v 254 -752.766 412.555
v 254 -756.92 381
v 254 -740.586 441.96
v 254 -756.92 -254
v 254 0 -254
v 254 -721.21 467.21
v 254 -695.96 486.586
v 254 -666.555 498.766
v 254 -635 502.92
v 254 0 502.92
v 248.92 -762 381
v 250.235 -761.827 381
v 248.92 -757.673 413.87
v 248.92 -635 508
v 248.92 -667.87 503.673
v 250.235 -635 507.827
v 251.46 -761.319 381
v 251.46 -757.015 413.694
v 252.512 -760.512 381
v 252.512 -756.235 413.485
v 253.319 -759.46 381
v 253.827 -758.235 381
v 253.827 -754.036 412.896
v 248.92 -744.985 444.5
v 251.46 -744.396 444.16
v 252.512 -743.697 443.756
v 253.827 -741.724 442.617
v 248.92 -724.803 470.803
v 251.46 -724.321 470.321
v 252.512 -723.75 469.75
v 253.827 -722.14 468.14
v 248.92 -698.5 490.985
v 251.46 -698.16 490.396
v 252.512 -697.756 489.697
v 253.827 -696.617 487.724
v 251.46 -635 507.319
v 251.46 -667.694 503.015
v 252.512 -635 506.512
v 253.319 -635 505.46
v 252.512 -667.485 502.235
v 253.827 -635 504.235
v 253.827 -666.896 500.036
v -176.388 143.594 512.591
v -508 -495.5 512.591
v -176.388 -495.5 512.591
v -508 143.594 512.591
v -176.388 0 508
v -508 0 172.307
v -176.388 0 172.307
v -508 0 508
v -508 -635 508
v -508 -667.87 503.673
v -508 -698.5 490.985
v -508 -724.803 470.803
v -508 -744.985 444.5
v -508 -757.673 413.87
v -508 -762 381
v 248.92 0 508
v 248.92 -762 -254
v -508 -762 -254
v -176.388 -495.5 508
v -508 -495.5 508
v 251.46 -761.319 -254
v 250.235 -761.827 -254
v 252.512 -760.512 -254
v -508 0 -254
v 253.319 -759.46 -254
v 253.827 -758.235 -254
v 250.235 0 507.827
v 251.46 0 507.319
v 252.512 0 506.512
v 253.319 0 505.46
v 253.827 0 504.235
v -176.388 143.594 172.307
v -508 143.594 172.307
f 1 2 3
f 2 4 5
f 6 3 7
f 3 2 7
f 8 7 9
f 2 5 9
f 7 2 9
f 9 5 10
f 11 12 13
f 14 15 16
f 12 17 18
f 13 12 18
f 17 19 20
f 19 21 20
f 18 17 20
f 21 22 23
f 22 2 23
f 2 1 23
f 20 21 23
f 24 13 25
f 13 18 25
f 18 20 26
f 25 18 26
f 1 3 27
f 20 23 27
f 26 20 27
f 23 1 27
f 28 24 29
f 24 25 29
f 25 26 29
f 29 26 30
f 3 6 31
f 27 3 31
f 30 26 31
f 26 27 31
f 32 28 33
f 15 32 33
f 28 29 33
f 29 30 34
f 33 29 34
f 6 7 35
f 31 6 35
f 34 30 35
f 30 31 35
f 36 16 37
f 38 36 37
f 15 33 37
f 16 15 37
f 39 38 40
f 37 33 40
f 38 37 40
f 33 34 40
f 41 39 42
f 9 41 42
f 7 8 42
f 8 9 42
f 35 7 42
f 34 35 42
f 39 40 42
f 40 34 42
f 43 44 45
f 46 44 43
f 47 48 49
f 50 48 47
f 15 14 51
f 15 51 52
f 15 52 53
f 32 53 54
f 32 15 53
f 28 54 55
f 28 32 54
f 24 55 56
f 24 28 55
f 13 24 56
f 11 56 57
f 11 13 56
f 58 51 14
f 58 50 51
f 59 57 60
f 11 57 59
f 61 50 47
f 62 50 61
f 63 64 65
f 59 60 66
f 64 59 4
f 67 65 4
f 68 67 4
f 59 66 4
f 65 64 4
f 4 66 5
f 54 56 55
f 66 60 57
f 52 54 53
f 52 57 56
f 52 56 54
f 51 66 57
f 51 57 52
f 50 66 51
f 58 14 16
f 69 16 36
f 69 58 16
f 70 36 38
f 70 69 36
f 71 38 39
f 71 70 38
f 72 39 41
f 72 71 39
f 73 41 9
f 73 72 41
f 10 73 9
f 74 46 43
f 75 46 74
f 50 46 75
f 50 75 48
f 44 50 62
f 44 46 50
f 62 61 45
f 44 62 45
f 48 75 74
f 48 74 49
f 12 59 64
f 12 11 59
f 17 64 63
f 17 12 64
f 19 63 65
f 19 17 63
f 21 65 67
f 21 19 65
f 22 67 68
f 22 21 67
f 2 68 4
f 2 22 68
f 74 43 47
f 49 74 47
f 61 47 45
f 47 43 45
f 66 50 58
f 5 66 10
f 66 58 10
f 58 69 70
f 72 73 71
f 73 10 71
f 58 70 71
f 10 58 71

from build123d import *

# Parameters (mm, degrees)
F0_W     = 762
F0_H     = 762
F1_DEPTH = 762
F2_R     = 127
F4_DEPTH = 331.61172
F5_R     = 5.08


with BuildPart() as f1:
    # F0 (on Front) → F1 (new body)
    with BuildSketch(Plane.XZ):
        with Locations((-127, 127)):
            Rectangle(F0_W, F0_H)
    extrude(amount=F1_DEPTH)

    # F2
    f2_edges = [f1.edges().sort_by_distance(p)[0] for p in [
        (-127, -762, 508),
    ]]
    fillet(f2_edges, radius=F2_R)

    # F5
    f5_edges = [f1.edges().sort_by_distance(p)[0] for p in [
        (254, -762, 63.5),
    ]]
    fillet(f5_edges, radius=F5_R)


with BuildPart() as f4:
    # F3 (on face) → F4 (new body)
    with BuildSketch(Plane(origin=(-508, 0, 0), x_dir=(0, -1, 0), z_dir=(-1, 0, 0))):
        Polygon((495.499879, 512.591183), (-143.593878, 512.591183), (-143.593878, 172.306985), (0, 172.306985), (0, 508), (495.499879, 508), align=None)
    extrude(amount=-F4_DEPTH)


solid = Compound([f1.part, f4.part])
